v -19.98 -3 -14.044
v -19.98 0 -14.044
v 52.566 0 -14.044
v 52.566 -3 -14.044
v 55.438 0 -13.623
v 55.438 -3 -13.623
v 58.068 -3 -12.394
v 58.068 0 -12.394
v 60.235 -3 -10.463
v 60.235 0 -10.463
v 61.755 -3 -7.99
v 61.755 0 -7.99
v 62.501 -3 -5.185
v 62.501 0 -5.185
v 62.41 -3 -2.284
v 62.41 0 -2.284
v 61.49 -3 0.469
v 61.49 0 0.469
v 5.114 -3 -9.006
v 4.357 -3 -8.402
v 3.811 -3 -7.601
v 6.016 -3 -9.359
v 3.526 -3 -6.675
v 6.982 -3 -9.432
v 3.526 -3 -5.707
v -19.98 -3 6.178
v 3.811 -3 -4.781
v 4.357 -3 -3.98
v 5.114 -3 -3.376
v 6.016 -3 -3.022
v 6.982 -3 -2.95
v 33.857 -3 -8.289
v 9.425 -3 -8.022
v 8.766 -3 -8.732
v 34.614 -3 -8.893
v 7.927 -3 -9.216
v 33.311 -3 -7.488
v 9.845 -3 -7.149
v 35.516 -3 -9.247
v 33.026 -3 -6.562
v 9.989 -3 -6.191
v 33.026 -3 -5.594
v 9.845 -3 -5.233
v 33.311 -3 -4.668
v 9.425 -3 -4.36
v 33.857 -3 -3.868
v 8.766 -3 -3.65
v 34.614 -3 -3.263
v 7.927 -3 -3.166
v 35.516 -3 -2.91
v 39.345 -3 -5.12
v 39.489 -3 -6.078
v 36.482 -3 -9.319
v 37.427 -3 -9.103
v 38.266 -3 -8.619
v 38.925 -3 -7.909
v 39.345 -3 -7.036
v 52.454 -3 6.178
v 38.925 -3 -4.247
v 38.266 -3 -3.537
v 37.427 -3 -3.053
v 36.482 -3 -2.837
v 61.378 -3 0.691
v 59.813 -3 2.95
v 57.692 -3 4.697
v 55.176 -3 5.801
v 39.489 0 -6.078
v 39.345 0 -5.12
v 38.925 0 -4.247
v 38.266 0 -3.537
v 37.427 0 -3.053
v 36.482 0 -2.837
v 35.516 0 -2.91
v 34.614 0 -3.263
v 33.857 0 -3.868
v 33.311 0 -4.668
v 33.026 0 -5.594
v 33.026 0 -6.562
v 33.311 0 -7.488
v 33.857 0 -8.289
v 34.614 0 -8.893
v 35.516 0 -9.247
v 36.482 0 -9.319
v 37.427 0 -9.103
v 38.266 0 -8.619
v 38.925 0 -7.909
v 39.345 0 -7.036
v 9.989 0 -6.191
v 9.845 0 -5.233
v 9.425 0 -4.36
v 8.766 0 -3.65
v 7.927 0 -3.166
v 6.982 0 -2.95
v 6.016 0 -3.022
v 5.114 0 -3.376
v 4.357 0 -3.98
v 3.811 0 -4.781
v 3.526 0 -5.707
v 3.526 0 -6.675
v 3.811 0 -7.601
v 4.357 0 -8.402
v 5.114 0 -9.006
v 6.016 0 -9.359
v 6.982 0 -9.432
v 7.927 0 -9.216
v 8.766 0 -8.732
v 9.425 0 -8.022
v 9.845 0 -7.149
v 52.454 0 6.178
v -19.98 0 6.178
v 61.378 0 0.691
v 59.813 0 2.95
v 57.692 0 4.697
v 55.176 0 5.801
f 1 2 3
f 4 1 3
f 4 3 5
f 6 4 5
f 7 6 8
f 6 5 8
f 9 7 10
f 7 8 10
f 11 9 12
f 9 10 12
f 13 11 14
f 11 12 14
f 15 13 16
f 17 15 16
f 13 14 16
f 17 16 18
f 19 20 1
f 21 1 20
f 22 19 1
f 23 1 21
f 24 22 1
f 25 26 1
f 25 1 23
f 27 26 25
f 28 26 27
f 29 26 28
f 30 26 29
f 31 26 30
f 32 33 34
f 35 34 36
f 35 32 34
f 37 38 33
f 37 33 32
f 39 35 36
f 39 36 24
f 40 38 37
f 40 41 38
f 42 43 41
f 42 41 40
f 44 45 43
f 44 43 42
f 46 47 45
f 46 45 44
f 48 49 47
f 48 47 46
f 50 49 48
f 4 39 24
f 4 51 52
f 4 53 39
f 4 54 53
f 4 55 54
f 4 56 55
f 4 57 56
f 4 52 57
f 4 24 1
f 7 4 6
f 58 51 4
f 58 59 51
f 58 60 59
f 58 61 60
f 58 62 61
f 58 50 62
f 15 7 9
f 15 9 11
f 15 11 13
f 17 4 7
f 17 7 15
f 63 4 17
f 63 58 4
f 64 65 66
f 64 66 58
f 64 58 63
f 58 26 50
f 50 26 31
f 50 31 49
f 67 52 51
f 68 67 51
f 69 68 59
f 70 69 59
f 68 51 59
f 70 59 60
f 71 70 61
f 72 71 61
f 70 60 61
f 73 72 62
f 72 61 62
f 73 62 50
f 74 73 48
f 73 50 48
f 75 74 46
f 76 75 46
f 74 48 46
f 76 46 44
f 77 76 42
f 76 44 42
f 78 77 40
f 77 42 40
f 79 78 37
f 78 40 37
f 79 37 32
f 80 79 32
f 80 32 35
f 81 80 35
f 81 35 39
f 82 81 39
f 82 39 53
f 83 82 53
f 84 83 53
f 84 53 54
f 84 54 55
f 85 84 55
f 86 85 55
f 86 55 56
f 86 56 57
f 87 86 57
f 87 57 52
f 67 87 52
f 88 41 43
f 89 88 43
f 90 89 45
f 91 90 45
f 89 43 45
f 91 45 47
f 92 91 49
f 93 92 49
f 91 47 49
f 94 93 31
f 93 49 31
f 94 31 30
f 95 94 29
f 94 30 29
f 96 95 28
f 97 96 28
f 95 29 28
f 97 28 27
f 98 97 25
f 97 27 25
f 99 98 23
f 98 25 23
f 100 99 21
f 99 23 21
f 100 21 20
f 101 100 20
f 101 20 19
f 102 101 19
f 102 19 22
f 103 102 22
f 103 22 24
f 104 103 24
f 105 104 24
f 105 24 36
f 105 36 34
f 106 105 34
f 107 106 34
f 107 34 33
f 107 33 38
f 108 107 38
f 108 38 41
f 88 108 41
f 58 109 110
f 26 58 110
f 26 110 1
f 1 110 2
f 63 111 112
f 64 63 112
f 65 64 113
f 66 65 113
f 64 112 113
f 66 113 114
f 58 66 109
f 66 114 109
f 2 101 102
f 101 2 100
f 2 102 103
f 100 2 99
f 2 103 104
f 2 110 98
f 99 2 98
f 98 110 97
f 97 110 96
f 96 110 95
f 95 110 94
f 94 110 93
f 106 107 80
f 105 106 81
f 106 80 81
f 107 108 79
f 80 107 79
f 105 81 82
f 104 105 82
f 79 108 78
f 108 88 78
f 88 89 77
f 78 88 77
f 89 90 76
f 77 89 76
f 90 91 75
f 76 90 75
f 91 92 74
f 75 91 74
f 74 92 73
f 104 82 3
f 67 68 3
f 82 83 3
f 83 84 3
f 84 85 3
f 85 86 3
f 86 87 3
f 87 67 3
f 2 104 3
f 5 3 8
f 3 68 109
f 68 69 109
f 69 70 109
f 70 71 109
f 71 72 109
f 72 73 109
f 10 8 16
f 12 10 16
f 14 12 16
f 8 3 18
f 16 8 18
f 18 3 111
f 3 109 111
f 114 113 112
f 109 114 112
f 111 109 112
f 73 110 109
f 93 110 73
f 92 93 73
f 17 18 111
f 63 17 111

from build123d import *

# Parameters (mm, degrees)
F1_DEPTH       = 3
F3_D           = 3.3
F3_DEPTH       = 14.4
F3_CBORE_D     = 6.5
F3_CBORE_DEPTH = 3
F3_TIP         = 0.9914200214


# Not quite as in the source:
# - a feature names something its author has since deleted; it is built from what else it names


with BuildPart() as f1:
    # F0 (on Front) → F1 (new body)
    with BuildSketch(Plane.XZ):
        with BuildLine():
            Line((52.4541210128, 6.1781848239), (-19.9804399163, 6.1781848239))
            Line((-19.9804399163, 6.1781848239), (-19.9804399163, -14.0438194092))
            Line((-19.9804399163, -14.0438194092), (52.5663935712, -14.0438194092))
            ThreePointArc((52.5663935712, -14.0438194092), (61.0848860922, -9.2816896986), (61.4901453485, 0.469123557))
            Line((61.4901453485, 0.469123557), (61.3778727901, 0.6911277901))
            ThreePointArc((61.3778727901, 0.6911277901), (57.6919913022, 4.696677345), (52.4541210128, 6.1781848239))
        make_face()
    extrude(amount=F1_DEPTH)

    # F3
    with Locations(Plane.XZ.offset(3)):
        with Locations((36.2392867059, -6.078066061), (6.7392867059, -6.1909663491)):
            CounterBoreHole(F3_D / 2, F3_CBORE_D / 2, F3_CBORE_DEPTH, depth=F3_DEPTH)
            with Locations((0, 0, -(F3_DEPTH + F3_TIP / 2))):  # 118° drill point
                Cone(0, F3_D / 2, F3_TIP, mode=Mode.SUBTRACT)


solid = f1.part
